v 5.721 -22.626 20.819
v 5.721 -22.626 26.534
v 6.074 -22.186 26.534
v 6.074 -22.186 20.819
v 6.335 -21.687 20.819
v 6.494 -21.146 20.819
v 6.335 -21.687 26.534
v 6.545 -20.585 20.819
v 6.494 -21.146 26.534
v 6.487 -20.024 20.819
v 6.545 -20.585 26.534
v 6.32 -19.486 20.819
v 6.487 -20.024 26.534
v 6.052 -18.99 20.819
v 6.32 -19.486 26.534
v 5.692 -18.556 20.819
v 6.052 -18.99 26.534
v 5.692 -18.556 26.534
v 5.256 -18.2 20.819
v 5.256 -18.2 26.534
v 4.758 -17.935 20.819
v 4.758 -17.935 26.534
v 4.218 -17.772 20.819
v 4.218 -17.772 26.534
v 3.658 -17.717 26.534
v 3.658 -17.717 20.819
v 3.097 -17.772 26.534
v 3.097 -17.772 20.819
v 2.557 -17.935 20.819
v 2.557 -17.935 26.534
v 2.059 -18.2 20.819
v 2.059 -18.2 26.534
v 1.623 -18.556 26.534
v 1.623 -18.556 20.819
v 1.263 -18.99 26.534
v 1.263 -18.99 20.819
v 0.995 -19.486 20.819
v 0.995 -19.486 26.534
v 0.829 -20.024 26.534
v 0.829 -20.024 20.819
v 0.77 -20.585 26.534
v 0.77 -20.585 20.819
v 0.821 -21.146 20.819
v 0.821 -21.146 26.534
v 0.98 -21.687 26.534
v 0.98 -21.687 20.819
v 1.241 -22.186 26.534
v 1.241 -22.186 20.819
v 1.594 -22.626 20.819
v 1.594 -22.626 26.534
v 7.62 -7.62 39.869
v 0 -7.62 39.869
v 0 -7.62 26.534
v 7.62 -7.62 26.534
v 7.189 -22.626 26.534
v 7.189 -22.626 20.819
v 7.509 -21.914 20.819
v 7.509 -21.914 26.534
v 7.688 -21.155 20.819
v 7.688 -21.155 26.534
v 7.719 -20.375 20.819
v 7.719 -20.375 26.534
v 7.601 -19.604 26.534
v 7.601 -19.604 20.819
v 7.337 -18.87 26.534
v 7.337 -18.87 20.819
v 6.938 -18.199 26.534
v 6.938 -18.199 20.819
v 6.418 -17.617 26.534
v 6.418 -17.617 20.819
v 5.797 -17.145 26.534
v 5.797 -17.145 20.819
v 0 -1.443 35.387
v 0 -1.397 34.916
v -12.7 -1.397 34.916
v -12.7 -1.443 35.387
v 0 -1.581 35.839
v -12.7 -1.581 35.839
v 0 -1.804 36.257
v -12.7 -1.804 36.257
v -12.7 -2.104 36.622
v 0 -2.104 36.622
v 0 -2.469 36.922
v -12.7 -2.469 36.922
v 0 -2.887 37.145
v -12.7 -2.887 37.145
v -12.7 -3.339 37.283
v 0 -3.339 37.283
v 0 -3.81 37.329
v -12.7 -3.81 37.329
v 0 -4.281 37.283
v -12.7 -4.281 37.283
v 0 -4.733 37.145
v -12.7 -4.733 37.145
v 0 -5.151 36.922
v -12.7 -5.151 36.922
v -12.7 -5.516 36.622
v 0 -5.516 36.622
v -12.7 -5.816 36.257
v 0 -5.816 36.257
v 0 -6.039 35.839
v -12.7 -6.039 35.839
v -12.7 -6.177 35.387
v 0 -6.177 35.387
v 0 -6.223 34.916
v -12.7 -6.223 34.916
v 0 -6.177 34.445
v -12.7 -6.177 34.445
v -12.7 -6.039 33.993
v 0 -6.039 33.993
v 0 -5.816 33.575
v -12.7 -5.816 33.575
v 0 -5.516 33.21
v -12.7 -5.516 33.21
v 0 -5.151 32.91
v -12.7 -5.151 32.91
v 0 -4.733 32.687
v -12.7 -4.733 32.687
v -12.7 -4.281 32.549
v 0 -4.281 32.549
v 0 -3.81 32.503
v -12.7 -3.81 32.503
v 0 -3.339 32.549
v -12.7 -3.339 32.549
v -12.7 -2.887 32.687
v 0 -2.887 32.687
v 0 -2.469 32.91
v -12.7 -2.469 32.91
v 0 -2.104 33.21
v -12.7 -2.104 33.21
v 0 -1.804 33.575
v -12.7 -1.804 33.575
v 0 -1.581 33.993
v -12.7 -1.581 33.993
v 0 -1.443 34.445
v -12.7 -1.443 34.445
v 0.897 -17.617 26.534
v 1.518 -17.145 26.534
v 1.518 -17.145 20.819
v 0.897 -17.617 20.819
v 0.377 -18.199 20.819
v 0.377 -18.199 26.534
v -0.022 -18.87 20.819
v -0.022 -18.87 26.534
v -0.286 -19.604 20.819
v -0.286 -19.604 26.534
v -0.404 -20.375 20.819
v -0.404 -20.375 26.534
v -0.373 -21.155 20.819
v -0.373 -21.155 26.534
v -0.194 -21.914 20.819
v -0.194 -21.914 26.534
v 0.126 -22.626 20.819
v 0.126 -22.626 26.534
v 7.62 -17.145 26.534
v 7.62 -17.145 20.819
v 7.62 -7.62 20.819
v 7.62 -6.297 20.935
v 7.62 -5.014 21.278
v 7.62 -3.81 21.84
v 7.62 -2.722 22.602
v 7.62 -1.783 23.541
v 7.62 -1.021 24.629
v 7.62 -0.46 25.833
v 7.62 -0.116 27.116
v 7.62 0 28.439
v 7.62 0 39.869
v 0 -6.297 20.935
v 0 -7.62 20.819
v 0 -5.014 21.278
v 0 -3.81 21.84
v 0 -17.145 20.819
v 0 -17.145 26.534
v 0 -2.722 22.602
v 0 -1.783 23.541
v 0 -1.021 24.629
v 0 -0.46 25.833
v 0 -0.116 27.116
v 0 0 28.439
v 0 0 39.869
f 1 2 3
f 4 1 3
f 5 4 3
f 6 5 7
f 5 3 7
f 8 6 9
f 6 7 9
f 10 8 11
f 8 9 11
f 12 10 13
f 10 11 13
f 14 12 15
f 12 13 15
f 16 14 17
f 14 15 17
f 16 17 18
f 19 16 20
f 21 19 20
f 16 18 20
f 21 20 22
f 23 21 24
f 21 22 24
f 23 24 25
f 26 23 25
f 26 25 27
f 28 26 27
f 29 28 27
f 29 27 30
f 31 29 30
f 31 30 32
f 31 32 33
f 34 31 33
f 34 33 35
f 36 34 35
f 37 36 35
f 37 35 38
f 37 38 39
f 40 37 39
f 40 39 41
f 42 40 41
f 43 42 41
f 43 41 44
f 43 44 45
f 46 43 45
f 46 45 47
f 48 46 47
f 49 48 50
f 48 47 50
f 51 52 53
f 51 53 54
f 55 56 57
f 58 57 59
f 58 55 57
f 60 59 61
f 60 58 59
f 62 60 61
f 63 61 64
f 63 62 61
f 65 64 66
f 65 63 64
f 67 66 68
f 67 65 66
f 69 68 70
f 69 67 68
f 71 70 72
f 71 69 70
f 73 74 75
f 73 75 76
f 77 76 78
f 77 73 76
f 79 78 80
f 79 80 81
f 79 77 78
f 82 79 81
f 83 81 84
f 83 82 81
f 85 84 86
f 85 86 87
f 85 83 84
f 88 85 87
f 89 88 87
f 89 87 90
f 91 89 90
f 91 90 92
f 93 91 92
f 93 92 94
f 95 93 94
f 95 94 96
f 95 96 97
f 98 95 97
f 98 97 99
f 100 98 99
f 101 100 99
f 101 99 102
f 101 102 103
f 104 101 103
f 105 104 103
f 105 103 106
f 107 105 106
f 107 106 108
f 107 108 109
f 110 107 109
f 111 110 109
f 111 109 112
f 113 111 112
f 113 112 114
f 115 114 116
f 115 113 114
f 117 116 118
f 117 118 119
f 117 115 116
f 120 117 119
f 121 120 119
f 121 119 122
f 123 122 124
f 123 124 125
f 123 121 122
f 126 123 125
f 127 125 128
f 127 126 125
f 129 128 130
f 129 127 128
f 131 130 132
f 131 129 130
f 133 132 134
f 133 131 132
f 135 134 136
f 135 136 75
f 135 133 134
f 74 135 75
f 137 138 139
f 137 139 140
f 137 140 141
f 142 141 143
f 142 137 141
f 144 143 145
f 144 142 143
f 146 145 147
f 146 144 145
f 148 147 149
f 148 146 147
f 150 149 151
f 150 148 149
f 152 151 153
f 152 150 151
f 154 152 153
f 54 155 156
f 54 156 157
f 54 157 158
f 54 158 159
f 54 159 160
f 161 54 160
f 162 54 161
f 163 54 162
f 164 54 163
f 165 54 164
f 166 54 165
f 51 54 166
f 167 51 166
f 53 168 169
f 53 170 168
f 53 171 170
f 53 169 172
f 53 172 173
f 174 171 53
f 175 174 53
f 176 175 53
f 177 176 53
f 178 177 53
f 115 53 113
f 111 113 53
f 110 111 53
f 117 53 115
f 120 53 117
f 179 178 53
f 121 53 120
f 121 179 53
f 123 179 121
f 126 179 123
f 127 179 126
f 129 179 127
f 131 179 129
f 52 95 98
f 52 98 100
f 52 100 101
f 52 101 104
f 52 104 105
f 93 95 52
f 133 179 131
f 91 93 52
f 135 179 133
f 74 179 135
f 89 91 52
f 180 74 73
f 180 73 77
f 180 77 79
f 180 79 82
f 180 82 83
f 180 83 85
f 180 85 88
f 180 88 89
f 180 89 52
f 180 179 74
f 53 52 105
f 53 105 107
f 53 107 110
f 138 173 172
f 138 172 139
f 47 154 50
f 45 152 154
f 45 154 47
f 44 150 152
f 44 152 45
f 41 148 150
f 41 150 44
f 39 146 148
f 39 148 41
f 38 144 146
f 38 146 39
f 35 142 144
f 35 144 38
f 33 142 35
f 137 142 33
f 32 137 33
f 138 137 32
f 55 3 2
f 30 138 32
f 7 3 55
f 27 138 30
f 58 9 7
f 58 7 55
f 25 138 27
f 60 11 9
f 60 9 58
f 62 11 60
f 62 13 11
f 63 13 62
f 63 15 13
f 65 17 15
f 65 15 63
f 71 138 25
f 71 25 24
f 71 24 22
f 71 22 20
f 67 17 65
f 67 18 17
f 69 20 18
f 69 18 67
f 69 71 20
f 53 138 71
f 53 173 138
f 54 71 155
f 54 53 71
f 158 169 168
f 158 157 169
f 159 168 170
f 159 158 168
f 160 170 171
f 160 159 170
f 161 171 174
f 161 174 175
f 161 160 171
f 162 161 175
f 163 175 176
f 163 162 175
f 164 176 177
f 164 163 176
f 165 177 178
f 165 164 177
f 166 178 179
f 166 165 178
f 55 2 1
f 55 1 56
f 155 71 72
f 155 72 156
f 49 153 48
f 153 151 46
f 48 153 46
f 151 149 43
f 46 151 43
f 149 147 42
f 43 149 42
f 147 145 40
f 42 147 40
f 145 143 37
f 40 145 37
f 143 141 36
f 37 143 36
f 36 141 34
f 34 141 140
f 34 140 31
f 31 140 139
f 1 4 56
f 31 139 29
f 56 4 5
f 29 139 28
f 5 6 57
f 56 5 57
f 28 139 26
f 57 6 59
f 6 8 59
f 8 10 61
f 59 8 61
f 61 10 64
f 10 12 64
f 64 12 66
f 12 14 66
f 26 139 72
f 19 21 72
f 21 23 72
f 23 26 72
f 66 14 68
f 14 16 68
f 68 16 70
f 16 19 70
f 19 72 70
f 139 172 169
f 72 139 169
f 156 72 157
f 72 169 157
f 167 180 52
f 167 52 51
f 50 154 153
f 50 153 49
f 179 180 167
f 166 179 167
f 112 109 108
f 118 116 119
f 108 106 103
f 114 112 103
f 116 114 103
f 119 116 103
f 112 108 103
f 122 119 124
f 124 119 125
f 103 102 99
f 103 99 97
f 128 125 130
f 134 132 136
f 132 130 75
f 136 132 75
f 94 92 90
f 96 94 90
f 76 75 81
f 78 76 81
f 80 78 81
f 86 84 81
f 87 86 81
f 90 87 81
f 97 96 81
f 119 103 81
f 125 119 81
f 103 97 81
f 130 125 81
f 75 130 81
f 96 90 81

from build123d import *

# Parameters (mm, degrees)
F0_W      = 5.08
F0_H      = 12.7
F1_DEPTH  = 5.08
F2_W      = 5.08
F2_H      = 3.81
F3_DEPTH  = 6.35
F4_R      = 5.08
F5_R      = 2.7121475218
F6_DEPTH  = 3.81
F7_R      = 1.9253373718
F8_DEPTH  = 3.81
F9_W      = 5.3527112813
F9_H      = 1.6279429131
F10_DEPTH = 3.81
F11_SCALE = 1.5
F12_R     = 2.413
F13_DEPTH = 20.32


with BuildPart() as f1:
    # F0 (on Front) → F1 (new body)
    with BuildSketch(Plane.XZ):
        with Locations((2.54, 20.2292869008)):
            Rectangle(F0_W, F0_H)
    extrude(amount=F1_DEPTH)

    # F2 (on face) → F3 (join)
    with BuildSketch(Plane.XZ.offset(5.08)):
        with Locations((2.54, 15.7842869008)):
            Rectangle(F2_W, F2_H)
    extrude(amount=F3_DEPTH)

    # F4
    f4_edges = [f1.edges().sort_by_distance(p)[0] for p in [
        (2.54, 0, 13.879287),
    ]]
    fillet(f4_edges, radius=F4_R)

    # F5 (on face) → F6 (join)
    with BuildSketch(Plane.XY.offset(17.6892869008)):
        with Locations((2.4383503072, -13.7368525874)):
            Circle(F5_R)
    extrude(amount=-F6_DEPTH)

    # F7 (on face) → F8 (cut)
    with BuildSketch(Plane.XY.offset(17.6892869008)):
        with Locations((2.4383503072, -13.7368525874)):
            Circle(F7_R)
    extrude(amount=-F8_DEPTH, mode=Mode.SUBTRACT)

    # F9 (on face) → F10 (cut)
    with BuildSketch(Plane.XY.offset(17.6892869008)):
        with Locations((2.7606785416, -15.8977832678)):
            Rectangle(F9_W, F9_H)
    extrude(amount=-F10_DEPTH, mode=Mode.SUBTRACT)


with BuildPart() as f1_1:
    # F11: moved
    add(f1.part.scale(F11_SCALE))

    # F12 (on face) → F13 (join)
    with BuildSketch(Plane.YZ.offset(7.62)):
        with Locations((-3.81, 34.9159303513)):
            Circle(F12_R)
    extrude(amount=-F13_DEPTH)


solid = f1_1.part
